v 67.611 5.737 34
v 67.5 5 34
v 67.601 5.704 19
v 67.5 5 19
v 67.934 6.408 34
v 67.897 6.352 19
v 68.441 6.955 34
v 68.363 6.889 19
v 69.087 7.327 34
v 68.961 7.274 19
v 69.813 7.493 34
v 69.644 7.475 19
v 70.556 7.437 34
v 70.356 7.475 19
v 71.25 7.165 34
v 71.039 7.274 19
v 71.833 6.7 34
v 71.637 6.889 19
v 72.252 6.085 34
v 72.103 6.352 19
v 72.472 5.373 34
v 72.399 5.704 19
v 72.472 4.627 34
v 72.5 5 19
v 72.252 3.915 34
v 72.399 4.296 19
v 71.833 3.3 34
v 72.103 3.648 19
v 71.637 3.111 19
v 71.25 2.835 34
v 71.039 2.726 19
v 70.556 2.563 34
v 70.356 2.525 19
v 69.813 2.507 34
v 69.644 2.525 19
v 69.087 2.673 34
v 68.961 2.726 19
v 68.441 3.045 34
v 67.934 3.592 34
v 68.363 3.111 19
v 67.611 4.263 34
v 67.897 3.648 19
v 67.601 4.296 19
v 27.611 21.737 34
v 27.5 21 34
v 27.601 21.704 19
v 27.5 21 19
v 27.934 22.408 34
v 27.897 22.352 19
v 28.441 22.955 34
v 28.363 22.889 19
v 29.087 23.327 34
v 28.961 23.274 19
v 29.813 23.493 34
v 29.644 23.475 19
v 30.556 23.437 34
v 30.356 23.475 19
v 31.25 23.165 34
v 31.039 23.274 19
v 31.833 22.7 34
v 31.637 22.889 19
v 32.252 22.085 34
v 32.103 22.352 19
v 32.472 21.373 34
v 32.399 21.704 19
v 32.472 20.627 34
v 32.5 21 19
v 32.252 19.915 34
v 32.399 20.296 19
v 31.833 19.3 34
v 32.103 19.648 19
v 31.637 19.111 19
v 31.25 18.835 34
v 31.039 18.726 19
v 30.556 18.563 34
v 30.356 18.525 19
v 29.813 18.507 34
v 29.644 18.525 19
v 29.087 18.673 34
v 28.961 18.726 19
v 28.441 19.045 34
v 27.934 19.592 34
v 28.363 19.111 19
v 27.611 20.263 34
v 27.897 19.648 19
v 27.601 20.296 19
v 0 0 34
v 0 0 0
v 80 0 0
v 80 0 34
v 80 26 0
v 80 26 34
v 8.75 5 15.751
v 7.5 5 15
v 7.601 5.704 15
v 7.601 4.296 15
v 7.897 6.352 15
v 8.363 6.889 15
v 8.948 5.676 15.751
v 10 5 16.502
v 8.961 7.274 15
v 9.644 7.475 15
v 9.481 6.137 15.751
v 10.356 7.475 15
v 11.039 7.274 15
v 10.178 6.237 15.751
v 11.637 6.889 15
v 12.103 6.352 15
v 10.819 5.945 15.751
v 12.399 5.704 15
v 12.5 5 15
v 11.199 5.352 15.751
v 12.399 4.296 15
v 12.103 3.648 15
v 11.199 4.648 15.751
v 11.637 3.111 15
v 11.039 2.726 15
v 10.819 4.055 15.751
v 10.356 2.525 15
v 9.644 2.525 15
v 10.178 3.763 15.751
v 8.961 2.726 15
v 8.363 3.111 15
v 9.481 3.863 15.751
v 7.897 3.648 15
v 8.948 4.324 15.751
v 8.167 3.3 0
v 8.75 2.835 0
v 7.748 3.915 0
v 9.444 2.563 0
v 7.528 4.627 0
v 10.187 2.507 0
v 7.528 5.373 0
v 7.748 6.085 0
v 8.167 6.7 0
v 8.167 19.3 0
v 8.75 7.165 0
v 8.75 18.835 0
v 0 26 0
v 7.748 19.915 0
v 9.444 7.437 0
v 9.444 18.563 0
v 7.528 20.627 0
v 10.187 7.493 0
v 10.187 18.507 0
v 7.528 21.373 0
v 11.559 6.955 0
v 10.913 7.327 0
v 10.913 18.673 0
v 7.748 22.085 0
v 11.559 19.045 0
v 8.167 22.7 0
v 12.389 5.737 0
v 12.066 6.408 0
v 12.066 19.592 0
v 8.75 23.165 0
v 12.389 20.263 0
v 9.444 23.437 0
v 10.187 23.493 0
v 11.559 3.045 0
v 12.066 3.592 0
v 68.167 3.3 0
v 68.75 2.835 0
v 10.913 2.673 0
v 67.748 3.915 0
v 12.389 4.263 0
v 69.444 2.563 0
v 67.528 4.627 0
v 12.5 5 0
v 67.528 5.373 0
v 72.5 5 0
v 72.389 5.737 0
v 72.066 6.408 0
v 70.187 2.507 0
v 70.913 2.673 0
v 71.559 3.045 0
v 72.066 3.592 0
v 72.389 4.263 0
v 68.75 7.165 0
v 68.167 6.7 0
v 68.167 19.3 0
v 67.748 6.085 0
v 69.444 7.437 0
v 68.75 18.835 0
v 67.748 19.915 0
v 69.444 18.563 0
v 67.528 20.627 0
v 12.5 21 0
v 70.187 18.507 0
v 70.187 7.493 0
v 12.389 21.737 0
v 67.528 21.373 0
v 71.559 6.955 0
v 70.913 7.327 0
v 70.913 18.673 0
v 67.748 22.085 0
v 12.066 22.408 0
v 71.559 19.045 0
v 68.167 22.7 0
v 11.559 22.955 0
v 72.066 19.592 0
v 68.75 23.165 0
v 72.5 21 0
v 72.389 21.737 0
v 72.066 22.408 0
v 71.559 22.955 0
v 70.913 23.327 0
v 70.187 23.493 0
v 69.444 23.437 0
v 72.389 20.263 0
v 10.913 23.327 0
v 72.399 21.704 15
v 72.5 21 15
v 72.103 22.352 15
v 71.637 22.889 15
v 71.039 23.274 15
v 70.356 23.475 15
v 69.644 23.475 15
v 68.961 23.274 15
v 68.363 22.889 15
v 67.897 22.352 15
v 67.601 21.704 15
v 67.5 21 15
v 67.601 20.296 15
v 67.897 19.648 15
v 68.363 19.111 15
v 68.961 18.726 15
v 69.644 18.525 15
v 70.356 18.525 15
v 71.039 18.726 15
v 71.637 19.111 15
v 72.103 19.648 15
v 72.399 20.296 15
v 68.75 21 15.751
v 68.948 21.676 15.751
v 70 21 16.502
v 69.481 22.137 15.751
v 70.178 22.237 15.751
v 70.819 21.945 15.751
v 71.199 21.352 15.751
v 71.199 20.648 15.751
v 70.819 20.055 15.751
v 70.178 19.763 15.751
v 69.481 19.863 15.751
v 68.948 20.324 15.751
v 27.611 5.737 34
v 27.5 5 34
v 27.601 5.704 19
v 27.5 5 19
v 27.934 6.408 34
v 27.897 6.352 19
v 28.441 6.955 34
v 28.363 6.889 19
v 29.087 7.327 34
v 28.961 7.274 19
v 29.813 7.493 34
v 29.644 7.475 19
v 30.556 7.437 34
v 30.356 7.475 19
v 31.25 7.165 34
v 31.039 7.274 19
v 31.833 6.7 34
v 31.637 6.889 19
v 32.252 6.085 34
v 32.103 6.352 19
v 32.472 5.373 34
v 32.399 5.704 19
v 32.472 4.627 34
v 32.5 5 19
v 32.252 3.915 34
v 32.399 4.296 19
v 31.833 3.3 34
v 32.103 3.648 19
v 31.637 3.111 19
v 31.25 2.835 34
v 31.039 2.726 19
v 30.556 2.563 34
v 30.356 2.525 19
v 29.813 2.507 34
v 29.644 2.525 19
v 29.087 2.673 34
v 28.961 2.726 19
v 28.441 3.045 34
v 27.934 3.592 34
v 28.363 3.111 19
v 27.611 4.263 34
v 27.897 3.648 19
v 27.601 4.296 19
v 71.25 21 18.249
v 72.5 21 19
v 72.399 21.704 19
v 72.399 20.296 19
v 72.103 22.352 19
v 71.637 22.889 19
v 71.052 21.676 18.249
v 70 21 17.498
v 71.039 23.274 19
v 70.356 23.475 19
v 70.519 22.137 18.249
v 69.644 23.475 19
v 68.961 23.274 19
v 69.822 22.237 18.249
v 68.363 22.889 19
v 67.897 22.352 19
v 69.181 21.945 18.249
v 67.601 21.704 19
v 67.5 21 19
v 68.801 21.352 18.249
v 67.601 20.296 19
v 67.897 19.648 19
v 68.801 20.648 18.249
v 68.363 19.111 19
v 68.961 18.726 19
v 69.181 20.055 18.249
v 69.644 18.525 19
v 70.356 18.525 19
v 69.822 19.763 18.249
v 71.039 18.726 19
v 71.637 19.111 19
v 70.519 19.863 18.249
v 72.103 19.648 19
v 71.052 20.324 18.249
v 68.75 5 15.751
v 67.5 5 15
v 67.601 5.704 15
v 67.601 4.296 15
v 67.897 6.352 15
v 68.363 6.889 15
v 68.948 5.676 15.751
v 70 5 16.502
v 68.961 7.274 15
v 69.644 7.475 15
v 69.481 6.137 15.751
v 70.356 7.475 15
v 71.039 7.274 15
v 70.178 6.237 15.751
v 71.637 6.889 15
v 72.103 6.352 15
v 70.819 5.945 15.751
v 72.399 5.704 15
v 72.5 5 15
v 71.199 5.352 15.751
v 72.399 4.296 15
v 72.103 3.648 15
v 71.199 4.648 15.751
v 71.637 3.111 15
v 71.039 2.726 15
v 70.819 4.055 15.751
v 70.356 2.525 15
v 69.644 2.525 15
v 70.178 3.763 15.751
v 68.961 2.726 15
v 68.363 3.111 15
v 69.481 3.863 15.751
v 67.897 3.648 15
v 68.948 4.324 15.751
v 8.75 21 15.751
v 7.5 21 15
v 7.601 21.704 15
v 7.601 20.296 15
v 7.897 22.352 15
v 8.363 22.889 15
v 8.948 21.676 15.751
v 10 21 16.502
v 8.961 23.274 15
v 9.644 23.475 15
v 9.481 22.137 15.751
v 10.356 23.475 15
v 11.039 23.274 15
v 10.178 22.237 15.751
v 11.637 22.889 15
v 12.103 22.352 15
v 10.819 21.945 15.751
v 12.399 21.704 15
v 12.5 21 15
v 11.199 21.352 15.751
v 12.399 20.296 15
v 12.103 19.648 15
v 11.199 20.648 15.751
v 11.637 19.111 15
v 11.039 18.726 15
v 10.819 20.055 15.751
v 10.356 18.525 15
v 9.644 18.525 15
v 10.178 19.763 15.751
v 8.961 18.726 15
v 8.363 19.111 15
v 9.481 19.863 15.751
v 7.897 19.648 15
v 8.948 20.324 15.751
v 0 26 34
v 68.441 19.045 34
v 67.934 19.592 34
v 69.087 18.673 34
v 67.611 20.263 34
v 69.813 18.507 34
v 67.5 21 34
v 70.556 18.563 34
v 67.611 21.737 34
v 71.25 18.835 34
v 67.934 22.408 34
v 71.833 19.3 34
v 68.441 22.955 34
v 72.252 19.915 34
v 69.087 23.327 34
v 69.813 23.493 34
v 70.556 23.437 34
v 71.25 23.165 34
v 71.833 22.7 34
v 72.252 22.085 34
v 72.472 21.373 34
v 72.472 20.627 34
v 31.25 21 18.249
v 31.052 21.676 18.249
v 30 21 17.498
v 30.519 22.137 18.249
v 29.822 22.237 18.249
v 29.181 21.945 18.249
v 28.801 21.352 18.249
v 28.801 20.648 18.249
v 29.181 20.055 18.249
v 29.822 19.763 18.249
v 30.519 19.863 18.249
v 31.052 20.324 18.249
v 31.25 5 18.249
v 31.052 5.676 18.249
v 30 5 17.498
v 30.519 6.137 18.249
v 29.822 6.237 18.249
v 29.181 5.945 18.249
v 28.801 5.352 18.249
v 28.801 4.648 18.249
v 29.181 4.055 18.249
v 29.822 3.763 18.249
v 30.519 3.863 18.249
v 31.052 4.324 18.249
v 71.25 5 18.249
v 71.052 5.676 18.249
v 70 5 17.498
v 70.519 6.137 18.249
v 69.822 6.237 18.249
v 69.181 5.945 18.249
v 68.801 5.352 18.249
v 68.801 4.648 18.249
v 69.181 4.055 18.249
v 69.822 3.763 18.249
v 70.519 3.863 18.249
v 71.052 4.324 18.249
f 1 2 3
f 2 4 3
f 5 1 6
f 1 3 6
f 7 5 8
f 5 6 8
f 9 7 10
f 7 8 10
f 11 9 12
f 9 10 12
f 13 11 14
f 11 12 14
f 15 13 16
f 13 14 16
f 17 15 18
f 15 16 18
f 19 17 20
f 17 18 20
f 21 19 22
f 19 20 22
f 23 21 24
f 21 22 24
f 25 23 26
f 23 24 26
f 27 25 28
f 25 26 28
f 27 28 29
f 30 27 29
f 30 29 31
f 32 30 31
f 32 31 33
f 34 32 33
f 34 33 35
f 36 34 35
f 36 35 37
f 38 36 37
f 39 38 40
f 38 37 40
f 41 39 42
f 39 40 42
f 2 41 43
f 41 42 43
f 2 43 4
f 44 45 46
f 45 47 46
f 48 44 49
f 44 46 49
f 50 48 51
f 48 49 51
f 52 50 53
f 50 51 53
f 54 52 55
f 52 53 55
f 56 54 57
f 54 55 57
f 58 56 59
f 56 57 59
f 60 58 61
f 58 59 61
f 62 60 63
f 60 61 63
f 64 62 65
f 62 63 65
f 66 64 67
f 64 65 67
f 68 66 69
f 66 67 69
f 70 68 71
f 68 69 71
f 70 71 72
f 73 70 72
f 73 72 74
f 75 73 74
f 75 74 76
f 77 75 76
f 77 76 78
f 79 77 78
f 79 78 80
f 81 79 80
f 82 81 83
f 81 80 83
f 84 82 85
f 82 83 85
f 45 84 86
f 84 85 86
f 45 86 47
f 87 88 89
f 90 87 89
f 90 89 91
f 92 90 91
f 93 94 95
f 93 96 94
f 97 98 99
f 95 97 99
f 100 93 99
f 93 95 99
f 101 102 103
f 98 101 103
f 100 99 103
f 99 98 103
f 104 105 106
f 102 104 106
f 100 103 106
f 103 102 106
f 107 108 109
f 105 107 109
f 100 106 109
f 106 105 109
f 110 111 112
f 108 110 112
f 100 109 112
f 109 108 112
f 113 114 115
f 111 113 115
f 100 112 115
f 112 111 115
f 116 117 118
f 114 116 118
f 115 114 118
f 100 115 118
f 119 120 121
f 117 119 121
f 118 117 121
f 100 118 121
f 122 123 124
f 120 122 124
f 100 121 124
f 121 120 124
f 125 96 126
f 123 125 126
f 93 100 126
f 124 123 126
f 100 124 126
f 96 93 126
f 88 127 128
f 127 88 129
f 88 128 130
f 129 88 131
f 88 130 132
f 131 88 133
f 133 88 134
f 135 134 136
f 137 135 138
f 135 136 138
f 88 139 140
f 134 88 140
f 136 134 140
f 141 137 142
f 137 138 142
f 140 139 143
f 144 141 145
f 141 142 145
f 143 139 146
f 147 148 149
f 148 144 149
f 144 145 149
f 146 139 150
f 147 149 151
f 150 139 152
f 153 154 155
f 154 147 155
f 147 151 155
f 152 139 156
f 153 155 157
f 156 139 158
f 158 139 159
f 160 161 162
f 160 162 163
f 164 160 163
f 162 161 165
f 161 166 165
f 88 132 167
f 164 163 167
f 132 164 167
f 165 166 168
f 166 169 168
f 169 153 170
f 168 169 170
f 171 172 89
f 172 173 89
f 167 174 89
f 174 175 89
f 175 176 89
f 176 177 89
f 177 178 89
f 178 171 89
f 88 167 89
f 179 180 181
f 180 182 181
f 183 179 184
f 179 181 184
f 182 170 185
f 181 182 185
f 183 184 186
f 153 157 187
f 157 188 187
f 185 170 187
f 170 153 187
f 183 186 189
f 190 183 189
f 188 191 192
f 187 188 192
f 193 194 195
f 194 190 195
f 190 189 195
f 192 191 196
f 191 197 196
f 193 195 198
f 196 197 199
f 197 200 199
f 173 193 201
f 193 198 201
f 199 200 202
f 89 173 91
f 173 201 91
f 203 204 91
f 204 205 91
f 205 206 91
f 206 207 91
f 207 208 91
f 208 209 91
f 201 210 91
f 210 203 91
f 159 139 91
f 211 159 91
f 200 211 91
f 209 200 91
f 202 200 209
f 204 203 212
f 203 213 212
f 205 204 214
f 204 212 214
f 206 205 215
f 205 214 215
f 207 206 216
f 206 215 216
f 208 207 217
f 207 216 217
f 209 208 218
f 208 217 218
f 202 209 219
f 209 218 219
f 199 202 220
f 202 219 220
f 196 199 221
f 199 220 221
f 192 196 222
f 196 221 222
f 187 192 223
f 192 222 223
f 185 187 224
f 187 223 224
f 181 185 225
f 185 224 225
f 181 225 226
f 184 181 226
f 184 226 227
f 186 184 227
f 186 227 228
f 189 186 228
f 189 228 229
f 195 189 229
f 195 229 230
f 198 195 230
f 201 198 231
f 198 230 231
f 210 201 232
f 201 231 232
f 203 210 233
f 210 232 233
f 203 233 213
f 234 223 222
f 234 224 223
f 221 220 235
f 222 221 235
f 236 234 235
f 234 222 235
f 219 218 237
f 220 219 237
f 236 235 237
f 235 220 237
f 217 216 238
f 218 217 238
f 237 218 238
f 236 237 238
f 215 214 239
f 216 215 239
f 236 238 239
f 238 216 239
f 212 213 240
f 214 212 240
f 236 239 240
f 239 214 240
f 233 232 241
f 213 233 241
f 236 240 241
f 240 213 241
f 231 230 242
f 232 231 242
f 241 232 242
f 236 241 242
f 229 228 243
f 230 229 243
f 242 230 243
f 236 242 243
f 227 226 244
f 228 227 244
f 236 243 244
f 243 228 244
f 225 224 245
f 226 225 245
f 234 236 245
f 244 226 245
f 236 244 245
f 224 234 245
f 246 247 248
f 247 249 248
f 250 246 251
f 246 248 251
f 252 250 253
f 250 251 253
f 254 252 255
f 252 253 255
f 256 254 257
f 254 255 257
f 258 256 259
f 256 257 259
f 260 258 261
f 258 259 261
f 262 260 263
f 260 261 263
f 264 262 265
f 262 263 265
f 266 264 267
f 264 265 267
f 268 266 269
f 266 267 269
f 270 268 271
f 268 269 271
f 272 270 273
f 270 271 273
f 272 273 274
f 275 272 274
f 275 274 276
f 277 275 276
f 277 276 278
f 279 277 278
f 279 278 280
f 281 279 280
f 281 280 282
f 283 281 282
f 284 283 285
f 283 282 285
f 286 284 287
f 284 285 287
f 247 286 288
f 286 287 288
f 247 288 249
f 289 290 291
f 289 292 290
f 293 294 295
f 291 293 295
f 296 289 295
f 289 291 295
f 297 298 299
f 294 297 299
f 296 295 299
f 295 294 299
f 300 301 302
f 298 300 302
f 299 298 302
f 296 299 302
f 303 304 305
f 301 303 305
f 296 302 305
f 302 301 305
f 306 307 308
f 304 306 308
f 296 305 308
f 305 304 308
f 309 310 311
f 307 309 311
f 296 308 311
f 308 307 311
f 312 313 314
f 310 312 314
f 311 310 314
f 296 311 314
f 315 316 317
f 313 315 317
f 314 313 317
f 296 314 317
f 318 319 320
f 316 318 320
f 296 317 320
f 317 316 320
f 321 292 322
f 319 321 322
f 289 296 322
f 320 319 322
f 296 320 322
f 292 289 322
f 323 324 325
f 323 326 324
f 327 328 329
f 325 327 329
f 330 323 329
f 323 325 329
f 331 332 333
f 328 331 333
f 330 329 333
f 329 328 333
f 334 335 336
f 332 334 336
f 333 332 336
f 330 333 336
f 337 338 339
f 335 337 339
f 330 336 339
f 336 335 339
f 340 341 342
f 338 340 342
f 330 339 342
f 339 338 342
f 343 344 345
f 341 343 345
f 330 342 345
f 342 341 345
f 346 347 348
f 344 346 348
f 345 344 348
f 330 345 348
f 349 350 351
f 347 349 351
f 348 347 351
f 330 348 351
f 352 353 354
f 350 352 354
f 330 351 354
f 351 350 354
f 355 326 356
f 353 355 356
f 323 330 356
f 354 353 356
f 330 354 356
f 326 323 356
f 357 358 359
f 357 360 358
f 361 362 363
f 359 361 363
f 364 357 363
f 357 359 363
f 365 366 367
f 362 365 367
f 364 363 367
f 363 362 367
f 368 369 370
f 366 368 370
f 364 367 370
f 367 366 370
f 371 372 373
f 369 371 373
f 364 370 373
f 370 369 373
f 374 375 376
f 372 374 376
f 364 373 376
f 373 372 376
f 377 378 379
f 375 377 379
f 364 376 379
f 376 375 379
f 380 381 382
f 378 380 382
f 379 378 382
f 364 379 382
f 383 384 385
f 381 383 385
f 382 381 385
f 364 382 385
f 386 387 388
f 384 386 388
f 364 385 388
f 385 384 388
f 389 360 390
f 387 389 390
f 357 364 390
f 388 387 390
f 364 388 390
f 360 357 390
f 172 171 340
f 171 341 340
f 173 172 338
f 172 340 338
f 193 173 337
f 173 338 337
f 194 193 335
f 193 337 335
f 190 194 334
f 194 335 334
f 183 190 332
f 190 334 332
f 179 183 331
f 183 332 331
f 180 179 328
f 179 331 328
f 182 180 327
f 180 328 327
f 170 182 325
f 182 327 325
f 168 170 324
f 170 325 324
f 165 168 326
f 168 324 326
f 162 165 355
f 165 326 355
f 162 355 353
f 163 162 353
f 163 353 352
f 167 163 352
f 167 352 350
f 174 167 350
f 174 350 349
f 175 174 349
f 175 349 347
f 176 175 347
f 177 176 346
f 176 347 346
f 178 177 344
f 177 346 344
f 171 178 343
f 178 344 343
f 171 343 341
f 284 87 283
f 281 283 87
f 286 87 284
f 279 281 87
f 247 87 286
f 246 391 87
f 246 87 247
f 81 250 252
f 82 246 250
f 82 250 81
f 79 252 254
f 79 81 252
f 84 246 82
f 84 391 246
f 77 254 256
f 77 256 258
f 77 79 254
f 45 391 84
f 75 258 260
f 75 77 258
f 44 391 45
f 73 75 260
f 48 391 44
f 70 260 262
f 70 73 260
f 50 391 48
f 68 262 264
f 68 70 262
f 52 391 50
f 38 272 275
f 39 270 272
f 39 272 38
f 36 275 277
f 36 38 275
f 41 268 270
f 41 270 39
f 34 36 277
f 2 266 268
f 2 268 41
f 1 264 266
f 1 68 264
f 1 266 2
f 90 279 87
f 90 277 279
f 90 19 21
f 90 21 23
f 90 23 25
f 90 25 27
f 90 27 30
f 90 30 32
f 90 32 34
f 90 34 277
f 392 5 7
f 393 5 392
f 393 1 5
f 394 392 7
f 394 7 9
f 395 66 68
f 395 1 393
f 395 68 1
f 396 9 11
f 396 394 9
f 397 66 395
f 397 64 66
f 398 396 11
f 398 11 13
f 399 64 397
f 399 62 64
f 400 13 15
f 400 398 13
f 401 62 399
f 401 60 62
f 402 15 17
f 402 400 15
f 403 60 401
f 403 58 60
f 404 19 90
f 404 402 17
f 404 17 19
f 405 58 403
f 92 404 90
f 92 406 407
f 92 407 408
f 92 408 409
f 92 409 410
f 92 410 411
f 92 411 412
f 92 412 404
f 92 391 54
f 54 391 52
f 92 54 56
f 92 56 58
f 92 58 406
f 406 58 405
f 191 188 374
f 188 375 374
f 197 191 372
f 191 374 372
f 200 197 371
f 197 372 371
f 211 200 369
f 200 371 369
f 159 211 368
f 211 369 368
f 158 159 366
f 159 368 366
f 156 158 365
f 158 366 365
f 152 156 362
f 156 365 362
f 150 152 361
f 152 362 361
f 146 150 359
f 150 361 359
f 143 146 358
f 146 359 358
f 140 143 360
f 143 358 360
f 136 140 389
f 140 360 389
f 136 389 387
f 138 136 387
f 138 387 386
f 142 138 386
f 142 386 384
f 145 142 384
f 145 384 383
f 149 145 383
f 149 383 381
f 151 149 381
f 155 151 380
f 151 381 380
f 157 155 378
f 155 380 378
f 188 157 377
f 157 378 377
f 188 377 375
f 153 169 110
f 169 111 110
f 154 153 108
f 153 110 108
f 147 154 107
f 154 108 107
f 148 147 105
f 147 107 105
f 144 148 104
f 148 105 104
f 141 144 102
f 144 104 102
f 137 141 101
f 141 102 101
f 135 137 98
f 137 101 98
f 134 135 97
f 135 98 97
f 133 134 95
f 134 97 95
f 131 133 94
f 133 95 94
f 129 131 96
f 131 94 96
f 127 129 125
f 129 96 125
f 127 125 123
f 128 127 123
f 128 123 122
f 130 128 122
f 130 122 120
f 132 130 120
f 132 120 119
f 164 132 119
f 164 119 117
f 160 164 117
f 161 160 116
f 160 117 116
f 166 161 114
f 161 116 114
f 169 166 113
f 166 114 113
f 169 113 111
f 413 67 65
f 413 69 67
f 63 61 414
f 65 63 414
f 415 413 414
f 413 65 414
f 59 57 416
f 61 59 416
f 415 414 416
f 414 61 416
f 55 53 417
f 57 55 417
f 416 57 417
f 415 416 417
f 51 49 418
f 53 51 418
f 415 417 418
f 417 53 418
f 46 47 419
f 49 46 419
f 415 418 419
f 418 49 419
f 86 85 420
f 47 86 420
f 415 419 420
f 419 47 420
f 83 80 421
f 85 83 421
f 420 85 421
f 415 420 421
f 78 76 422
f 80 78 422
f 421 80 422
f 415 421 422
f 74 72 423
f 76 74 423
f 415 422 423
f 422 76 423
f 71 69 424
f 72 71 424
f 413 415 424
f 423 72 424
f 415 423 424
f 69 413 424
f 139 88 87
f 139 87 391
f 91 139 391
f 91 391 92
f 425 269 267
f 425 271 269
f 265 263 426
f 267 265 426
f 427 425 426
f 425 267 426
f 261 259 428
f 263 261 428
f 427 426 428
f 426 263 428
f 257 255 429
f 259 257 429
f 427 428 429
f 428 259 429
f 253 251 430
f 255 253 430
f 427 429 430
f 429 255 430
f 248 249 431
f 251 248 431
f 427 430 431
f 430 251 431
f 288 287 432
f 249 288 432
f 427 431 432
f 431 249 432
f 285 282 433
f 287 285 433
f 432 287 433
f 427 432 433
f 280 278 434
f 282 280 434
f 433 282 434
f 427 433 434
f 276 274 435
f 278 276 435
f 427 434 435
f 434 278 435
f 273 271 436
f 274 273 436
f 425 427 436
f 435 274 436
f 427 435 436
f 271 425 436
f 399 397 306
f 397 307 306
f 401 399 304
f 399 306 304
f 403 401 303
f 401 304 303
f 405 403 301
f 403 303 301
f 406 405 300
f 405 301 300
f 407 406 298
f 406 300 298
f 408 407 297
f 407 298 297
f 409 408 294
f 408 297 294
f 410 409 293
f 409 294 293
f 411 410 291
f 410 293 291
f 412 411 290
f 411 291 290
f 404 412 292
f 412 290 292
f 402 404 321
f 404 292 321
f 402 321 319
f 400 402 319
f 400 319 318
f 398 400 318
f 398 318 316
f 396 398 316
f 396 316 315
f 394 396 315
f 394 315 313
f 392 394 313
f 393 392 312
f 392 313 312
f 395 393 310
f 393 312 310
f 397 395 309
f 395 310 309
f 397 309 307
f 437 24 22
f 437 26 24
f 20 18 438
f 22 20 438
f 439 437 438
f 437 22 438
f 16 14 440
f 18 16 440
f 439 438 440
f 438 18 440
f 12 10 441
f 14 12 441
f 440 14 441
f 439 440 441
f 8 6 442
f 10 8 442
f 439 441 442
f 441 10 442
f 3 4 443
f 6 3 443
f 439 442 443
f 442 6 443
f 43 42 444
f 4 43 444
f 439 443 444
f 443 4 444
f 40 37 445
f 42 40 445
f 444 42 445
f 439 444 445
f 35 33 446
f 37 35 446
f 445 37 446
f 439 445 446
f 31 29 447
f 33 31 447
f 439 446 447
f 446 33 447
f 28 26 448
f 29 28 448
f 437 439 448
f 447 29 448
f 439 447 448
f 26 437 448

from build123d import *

# Parameters (mm, degrees)
SKETCH_1_W             = 80
SKETCH_1_H             = 26
EXTRUDE_1_DEPTH        = 34
HOLE_WIZARD_M6_1_D     = 5
HOLE_WIZARD_M6_1_DEPTH = 15
HOLE_WIZARD_M6_1_TIP   = 1.502151548
HOLE_WIZARD_M6_2_D     = 5
HOLE_WIZARD_M6_2_DEPTH = 15
HOLE_WIZARD_M6_2_TIP   = 1.502151548


with BuildPart() as part:
    # 草图1 → 凸台-拉伸1 (new body)
    with BuildSketch(Plane.XY):
        with Locations((40, 13)):
            Rectangle(SKETCH_1_W, SKETCH_1_H)
    extrude(amount=EXTRUDE_1_DEPTH)

    # M6 螺纹孔1
    with Locations(Plane.XY.offset(34)):
        with Locations((70, 21), (70, 5), (30, 21), (30, 5)):
            Hole(HOLE_WIZARD_M6_1_D / 2, depth=HOLE_WIZARD_M6_1_DEPTH)
            with Locations((0, 0, -(HOLE_WIZARD_M6_1_DEPTH + HOLE_WIZARD_M6_1_TIP / 2))):  # 118° drill point
                Cone(0, HOLE_WIZARD_M6_1_D / 2, HOLE_WIZARD_M6_1_TIP, mode=Mode.SUBTRACT)

    # M6 螺纹孔2
    with Locations(Plane(origin=(0, 0, 0), x_dir=(-1, 0, 0), z_dir=(0, 0, -1))):
        with Locations((-10, 5), (-10, 21), (-70, 21), (-70, 5)):
            Hole(HOLE_WIZARD_M6_2_D / 2, depth=HOLE_WIZARD_M6_2_DEPTH)
            with Locations((0, 0, -(HOLE_WIZARD_M6_2_DEPTH + HOLE_WIZARD_M6_2_TIP / 2))):  # 118° drill point
                Cone(0, HOLE_WIZARD_M6_2_D / 2, HOLE_WIZARD_M6_2_TIP, mode=Mode.SUBTRACT)


solid = part.part
